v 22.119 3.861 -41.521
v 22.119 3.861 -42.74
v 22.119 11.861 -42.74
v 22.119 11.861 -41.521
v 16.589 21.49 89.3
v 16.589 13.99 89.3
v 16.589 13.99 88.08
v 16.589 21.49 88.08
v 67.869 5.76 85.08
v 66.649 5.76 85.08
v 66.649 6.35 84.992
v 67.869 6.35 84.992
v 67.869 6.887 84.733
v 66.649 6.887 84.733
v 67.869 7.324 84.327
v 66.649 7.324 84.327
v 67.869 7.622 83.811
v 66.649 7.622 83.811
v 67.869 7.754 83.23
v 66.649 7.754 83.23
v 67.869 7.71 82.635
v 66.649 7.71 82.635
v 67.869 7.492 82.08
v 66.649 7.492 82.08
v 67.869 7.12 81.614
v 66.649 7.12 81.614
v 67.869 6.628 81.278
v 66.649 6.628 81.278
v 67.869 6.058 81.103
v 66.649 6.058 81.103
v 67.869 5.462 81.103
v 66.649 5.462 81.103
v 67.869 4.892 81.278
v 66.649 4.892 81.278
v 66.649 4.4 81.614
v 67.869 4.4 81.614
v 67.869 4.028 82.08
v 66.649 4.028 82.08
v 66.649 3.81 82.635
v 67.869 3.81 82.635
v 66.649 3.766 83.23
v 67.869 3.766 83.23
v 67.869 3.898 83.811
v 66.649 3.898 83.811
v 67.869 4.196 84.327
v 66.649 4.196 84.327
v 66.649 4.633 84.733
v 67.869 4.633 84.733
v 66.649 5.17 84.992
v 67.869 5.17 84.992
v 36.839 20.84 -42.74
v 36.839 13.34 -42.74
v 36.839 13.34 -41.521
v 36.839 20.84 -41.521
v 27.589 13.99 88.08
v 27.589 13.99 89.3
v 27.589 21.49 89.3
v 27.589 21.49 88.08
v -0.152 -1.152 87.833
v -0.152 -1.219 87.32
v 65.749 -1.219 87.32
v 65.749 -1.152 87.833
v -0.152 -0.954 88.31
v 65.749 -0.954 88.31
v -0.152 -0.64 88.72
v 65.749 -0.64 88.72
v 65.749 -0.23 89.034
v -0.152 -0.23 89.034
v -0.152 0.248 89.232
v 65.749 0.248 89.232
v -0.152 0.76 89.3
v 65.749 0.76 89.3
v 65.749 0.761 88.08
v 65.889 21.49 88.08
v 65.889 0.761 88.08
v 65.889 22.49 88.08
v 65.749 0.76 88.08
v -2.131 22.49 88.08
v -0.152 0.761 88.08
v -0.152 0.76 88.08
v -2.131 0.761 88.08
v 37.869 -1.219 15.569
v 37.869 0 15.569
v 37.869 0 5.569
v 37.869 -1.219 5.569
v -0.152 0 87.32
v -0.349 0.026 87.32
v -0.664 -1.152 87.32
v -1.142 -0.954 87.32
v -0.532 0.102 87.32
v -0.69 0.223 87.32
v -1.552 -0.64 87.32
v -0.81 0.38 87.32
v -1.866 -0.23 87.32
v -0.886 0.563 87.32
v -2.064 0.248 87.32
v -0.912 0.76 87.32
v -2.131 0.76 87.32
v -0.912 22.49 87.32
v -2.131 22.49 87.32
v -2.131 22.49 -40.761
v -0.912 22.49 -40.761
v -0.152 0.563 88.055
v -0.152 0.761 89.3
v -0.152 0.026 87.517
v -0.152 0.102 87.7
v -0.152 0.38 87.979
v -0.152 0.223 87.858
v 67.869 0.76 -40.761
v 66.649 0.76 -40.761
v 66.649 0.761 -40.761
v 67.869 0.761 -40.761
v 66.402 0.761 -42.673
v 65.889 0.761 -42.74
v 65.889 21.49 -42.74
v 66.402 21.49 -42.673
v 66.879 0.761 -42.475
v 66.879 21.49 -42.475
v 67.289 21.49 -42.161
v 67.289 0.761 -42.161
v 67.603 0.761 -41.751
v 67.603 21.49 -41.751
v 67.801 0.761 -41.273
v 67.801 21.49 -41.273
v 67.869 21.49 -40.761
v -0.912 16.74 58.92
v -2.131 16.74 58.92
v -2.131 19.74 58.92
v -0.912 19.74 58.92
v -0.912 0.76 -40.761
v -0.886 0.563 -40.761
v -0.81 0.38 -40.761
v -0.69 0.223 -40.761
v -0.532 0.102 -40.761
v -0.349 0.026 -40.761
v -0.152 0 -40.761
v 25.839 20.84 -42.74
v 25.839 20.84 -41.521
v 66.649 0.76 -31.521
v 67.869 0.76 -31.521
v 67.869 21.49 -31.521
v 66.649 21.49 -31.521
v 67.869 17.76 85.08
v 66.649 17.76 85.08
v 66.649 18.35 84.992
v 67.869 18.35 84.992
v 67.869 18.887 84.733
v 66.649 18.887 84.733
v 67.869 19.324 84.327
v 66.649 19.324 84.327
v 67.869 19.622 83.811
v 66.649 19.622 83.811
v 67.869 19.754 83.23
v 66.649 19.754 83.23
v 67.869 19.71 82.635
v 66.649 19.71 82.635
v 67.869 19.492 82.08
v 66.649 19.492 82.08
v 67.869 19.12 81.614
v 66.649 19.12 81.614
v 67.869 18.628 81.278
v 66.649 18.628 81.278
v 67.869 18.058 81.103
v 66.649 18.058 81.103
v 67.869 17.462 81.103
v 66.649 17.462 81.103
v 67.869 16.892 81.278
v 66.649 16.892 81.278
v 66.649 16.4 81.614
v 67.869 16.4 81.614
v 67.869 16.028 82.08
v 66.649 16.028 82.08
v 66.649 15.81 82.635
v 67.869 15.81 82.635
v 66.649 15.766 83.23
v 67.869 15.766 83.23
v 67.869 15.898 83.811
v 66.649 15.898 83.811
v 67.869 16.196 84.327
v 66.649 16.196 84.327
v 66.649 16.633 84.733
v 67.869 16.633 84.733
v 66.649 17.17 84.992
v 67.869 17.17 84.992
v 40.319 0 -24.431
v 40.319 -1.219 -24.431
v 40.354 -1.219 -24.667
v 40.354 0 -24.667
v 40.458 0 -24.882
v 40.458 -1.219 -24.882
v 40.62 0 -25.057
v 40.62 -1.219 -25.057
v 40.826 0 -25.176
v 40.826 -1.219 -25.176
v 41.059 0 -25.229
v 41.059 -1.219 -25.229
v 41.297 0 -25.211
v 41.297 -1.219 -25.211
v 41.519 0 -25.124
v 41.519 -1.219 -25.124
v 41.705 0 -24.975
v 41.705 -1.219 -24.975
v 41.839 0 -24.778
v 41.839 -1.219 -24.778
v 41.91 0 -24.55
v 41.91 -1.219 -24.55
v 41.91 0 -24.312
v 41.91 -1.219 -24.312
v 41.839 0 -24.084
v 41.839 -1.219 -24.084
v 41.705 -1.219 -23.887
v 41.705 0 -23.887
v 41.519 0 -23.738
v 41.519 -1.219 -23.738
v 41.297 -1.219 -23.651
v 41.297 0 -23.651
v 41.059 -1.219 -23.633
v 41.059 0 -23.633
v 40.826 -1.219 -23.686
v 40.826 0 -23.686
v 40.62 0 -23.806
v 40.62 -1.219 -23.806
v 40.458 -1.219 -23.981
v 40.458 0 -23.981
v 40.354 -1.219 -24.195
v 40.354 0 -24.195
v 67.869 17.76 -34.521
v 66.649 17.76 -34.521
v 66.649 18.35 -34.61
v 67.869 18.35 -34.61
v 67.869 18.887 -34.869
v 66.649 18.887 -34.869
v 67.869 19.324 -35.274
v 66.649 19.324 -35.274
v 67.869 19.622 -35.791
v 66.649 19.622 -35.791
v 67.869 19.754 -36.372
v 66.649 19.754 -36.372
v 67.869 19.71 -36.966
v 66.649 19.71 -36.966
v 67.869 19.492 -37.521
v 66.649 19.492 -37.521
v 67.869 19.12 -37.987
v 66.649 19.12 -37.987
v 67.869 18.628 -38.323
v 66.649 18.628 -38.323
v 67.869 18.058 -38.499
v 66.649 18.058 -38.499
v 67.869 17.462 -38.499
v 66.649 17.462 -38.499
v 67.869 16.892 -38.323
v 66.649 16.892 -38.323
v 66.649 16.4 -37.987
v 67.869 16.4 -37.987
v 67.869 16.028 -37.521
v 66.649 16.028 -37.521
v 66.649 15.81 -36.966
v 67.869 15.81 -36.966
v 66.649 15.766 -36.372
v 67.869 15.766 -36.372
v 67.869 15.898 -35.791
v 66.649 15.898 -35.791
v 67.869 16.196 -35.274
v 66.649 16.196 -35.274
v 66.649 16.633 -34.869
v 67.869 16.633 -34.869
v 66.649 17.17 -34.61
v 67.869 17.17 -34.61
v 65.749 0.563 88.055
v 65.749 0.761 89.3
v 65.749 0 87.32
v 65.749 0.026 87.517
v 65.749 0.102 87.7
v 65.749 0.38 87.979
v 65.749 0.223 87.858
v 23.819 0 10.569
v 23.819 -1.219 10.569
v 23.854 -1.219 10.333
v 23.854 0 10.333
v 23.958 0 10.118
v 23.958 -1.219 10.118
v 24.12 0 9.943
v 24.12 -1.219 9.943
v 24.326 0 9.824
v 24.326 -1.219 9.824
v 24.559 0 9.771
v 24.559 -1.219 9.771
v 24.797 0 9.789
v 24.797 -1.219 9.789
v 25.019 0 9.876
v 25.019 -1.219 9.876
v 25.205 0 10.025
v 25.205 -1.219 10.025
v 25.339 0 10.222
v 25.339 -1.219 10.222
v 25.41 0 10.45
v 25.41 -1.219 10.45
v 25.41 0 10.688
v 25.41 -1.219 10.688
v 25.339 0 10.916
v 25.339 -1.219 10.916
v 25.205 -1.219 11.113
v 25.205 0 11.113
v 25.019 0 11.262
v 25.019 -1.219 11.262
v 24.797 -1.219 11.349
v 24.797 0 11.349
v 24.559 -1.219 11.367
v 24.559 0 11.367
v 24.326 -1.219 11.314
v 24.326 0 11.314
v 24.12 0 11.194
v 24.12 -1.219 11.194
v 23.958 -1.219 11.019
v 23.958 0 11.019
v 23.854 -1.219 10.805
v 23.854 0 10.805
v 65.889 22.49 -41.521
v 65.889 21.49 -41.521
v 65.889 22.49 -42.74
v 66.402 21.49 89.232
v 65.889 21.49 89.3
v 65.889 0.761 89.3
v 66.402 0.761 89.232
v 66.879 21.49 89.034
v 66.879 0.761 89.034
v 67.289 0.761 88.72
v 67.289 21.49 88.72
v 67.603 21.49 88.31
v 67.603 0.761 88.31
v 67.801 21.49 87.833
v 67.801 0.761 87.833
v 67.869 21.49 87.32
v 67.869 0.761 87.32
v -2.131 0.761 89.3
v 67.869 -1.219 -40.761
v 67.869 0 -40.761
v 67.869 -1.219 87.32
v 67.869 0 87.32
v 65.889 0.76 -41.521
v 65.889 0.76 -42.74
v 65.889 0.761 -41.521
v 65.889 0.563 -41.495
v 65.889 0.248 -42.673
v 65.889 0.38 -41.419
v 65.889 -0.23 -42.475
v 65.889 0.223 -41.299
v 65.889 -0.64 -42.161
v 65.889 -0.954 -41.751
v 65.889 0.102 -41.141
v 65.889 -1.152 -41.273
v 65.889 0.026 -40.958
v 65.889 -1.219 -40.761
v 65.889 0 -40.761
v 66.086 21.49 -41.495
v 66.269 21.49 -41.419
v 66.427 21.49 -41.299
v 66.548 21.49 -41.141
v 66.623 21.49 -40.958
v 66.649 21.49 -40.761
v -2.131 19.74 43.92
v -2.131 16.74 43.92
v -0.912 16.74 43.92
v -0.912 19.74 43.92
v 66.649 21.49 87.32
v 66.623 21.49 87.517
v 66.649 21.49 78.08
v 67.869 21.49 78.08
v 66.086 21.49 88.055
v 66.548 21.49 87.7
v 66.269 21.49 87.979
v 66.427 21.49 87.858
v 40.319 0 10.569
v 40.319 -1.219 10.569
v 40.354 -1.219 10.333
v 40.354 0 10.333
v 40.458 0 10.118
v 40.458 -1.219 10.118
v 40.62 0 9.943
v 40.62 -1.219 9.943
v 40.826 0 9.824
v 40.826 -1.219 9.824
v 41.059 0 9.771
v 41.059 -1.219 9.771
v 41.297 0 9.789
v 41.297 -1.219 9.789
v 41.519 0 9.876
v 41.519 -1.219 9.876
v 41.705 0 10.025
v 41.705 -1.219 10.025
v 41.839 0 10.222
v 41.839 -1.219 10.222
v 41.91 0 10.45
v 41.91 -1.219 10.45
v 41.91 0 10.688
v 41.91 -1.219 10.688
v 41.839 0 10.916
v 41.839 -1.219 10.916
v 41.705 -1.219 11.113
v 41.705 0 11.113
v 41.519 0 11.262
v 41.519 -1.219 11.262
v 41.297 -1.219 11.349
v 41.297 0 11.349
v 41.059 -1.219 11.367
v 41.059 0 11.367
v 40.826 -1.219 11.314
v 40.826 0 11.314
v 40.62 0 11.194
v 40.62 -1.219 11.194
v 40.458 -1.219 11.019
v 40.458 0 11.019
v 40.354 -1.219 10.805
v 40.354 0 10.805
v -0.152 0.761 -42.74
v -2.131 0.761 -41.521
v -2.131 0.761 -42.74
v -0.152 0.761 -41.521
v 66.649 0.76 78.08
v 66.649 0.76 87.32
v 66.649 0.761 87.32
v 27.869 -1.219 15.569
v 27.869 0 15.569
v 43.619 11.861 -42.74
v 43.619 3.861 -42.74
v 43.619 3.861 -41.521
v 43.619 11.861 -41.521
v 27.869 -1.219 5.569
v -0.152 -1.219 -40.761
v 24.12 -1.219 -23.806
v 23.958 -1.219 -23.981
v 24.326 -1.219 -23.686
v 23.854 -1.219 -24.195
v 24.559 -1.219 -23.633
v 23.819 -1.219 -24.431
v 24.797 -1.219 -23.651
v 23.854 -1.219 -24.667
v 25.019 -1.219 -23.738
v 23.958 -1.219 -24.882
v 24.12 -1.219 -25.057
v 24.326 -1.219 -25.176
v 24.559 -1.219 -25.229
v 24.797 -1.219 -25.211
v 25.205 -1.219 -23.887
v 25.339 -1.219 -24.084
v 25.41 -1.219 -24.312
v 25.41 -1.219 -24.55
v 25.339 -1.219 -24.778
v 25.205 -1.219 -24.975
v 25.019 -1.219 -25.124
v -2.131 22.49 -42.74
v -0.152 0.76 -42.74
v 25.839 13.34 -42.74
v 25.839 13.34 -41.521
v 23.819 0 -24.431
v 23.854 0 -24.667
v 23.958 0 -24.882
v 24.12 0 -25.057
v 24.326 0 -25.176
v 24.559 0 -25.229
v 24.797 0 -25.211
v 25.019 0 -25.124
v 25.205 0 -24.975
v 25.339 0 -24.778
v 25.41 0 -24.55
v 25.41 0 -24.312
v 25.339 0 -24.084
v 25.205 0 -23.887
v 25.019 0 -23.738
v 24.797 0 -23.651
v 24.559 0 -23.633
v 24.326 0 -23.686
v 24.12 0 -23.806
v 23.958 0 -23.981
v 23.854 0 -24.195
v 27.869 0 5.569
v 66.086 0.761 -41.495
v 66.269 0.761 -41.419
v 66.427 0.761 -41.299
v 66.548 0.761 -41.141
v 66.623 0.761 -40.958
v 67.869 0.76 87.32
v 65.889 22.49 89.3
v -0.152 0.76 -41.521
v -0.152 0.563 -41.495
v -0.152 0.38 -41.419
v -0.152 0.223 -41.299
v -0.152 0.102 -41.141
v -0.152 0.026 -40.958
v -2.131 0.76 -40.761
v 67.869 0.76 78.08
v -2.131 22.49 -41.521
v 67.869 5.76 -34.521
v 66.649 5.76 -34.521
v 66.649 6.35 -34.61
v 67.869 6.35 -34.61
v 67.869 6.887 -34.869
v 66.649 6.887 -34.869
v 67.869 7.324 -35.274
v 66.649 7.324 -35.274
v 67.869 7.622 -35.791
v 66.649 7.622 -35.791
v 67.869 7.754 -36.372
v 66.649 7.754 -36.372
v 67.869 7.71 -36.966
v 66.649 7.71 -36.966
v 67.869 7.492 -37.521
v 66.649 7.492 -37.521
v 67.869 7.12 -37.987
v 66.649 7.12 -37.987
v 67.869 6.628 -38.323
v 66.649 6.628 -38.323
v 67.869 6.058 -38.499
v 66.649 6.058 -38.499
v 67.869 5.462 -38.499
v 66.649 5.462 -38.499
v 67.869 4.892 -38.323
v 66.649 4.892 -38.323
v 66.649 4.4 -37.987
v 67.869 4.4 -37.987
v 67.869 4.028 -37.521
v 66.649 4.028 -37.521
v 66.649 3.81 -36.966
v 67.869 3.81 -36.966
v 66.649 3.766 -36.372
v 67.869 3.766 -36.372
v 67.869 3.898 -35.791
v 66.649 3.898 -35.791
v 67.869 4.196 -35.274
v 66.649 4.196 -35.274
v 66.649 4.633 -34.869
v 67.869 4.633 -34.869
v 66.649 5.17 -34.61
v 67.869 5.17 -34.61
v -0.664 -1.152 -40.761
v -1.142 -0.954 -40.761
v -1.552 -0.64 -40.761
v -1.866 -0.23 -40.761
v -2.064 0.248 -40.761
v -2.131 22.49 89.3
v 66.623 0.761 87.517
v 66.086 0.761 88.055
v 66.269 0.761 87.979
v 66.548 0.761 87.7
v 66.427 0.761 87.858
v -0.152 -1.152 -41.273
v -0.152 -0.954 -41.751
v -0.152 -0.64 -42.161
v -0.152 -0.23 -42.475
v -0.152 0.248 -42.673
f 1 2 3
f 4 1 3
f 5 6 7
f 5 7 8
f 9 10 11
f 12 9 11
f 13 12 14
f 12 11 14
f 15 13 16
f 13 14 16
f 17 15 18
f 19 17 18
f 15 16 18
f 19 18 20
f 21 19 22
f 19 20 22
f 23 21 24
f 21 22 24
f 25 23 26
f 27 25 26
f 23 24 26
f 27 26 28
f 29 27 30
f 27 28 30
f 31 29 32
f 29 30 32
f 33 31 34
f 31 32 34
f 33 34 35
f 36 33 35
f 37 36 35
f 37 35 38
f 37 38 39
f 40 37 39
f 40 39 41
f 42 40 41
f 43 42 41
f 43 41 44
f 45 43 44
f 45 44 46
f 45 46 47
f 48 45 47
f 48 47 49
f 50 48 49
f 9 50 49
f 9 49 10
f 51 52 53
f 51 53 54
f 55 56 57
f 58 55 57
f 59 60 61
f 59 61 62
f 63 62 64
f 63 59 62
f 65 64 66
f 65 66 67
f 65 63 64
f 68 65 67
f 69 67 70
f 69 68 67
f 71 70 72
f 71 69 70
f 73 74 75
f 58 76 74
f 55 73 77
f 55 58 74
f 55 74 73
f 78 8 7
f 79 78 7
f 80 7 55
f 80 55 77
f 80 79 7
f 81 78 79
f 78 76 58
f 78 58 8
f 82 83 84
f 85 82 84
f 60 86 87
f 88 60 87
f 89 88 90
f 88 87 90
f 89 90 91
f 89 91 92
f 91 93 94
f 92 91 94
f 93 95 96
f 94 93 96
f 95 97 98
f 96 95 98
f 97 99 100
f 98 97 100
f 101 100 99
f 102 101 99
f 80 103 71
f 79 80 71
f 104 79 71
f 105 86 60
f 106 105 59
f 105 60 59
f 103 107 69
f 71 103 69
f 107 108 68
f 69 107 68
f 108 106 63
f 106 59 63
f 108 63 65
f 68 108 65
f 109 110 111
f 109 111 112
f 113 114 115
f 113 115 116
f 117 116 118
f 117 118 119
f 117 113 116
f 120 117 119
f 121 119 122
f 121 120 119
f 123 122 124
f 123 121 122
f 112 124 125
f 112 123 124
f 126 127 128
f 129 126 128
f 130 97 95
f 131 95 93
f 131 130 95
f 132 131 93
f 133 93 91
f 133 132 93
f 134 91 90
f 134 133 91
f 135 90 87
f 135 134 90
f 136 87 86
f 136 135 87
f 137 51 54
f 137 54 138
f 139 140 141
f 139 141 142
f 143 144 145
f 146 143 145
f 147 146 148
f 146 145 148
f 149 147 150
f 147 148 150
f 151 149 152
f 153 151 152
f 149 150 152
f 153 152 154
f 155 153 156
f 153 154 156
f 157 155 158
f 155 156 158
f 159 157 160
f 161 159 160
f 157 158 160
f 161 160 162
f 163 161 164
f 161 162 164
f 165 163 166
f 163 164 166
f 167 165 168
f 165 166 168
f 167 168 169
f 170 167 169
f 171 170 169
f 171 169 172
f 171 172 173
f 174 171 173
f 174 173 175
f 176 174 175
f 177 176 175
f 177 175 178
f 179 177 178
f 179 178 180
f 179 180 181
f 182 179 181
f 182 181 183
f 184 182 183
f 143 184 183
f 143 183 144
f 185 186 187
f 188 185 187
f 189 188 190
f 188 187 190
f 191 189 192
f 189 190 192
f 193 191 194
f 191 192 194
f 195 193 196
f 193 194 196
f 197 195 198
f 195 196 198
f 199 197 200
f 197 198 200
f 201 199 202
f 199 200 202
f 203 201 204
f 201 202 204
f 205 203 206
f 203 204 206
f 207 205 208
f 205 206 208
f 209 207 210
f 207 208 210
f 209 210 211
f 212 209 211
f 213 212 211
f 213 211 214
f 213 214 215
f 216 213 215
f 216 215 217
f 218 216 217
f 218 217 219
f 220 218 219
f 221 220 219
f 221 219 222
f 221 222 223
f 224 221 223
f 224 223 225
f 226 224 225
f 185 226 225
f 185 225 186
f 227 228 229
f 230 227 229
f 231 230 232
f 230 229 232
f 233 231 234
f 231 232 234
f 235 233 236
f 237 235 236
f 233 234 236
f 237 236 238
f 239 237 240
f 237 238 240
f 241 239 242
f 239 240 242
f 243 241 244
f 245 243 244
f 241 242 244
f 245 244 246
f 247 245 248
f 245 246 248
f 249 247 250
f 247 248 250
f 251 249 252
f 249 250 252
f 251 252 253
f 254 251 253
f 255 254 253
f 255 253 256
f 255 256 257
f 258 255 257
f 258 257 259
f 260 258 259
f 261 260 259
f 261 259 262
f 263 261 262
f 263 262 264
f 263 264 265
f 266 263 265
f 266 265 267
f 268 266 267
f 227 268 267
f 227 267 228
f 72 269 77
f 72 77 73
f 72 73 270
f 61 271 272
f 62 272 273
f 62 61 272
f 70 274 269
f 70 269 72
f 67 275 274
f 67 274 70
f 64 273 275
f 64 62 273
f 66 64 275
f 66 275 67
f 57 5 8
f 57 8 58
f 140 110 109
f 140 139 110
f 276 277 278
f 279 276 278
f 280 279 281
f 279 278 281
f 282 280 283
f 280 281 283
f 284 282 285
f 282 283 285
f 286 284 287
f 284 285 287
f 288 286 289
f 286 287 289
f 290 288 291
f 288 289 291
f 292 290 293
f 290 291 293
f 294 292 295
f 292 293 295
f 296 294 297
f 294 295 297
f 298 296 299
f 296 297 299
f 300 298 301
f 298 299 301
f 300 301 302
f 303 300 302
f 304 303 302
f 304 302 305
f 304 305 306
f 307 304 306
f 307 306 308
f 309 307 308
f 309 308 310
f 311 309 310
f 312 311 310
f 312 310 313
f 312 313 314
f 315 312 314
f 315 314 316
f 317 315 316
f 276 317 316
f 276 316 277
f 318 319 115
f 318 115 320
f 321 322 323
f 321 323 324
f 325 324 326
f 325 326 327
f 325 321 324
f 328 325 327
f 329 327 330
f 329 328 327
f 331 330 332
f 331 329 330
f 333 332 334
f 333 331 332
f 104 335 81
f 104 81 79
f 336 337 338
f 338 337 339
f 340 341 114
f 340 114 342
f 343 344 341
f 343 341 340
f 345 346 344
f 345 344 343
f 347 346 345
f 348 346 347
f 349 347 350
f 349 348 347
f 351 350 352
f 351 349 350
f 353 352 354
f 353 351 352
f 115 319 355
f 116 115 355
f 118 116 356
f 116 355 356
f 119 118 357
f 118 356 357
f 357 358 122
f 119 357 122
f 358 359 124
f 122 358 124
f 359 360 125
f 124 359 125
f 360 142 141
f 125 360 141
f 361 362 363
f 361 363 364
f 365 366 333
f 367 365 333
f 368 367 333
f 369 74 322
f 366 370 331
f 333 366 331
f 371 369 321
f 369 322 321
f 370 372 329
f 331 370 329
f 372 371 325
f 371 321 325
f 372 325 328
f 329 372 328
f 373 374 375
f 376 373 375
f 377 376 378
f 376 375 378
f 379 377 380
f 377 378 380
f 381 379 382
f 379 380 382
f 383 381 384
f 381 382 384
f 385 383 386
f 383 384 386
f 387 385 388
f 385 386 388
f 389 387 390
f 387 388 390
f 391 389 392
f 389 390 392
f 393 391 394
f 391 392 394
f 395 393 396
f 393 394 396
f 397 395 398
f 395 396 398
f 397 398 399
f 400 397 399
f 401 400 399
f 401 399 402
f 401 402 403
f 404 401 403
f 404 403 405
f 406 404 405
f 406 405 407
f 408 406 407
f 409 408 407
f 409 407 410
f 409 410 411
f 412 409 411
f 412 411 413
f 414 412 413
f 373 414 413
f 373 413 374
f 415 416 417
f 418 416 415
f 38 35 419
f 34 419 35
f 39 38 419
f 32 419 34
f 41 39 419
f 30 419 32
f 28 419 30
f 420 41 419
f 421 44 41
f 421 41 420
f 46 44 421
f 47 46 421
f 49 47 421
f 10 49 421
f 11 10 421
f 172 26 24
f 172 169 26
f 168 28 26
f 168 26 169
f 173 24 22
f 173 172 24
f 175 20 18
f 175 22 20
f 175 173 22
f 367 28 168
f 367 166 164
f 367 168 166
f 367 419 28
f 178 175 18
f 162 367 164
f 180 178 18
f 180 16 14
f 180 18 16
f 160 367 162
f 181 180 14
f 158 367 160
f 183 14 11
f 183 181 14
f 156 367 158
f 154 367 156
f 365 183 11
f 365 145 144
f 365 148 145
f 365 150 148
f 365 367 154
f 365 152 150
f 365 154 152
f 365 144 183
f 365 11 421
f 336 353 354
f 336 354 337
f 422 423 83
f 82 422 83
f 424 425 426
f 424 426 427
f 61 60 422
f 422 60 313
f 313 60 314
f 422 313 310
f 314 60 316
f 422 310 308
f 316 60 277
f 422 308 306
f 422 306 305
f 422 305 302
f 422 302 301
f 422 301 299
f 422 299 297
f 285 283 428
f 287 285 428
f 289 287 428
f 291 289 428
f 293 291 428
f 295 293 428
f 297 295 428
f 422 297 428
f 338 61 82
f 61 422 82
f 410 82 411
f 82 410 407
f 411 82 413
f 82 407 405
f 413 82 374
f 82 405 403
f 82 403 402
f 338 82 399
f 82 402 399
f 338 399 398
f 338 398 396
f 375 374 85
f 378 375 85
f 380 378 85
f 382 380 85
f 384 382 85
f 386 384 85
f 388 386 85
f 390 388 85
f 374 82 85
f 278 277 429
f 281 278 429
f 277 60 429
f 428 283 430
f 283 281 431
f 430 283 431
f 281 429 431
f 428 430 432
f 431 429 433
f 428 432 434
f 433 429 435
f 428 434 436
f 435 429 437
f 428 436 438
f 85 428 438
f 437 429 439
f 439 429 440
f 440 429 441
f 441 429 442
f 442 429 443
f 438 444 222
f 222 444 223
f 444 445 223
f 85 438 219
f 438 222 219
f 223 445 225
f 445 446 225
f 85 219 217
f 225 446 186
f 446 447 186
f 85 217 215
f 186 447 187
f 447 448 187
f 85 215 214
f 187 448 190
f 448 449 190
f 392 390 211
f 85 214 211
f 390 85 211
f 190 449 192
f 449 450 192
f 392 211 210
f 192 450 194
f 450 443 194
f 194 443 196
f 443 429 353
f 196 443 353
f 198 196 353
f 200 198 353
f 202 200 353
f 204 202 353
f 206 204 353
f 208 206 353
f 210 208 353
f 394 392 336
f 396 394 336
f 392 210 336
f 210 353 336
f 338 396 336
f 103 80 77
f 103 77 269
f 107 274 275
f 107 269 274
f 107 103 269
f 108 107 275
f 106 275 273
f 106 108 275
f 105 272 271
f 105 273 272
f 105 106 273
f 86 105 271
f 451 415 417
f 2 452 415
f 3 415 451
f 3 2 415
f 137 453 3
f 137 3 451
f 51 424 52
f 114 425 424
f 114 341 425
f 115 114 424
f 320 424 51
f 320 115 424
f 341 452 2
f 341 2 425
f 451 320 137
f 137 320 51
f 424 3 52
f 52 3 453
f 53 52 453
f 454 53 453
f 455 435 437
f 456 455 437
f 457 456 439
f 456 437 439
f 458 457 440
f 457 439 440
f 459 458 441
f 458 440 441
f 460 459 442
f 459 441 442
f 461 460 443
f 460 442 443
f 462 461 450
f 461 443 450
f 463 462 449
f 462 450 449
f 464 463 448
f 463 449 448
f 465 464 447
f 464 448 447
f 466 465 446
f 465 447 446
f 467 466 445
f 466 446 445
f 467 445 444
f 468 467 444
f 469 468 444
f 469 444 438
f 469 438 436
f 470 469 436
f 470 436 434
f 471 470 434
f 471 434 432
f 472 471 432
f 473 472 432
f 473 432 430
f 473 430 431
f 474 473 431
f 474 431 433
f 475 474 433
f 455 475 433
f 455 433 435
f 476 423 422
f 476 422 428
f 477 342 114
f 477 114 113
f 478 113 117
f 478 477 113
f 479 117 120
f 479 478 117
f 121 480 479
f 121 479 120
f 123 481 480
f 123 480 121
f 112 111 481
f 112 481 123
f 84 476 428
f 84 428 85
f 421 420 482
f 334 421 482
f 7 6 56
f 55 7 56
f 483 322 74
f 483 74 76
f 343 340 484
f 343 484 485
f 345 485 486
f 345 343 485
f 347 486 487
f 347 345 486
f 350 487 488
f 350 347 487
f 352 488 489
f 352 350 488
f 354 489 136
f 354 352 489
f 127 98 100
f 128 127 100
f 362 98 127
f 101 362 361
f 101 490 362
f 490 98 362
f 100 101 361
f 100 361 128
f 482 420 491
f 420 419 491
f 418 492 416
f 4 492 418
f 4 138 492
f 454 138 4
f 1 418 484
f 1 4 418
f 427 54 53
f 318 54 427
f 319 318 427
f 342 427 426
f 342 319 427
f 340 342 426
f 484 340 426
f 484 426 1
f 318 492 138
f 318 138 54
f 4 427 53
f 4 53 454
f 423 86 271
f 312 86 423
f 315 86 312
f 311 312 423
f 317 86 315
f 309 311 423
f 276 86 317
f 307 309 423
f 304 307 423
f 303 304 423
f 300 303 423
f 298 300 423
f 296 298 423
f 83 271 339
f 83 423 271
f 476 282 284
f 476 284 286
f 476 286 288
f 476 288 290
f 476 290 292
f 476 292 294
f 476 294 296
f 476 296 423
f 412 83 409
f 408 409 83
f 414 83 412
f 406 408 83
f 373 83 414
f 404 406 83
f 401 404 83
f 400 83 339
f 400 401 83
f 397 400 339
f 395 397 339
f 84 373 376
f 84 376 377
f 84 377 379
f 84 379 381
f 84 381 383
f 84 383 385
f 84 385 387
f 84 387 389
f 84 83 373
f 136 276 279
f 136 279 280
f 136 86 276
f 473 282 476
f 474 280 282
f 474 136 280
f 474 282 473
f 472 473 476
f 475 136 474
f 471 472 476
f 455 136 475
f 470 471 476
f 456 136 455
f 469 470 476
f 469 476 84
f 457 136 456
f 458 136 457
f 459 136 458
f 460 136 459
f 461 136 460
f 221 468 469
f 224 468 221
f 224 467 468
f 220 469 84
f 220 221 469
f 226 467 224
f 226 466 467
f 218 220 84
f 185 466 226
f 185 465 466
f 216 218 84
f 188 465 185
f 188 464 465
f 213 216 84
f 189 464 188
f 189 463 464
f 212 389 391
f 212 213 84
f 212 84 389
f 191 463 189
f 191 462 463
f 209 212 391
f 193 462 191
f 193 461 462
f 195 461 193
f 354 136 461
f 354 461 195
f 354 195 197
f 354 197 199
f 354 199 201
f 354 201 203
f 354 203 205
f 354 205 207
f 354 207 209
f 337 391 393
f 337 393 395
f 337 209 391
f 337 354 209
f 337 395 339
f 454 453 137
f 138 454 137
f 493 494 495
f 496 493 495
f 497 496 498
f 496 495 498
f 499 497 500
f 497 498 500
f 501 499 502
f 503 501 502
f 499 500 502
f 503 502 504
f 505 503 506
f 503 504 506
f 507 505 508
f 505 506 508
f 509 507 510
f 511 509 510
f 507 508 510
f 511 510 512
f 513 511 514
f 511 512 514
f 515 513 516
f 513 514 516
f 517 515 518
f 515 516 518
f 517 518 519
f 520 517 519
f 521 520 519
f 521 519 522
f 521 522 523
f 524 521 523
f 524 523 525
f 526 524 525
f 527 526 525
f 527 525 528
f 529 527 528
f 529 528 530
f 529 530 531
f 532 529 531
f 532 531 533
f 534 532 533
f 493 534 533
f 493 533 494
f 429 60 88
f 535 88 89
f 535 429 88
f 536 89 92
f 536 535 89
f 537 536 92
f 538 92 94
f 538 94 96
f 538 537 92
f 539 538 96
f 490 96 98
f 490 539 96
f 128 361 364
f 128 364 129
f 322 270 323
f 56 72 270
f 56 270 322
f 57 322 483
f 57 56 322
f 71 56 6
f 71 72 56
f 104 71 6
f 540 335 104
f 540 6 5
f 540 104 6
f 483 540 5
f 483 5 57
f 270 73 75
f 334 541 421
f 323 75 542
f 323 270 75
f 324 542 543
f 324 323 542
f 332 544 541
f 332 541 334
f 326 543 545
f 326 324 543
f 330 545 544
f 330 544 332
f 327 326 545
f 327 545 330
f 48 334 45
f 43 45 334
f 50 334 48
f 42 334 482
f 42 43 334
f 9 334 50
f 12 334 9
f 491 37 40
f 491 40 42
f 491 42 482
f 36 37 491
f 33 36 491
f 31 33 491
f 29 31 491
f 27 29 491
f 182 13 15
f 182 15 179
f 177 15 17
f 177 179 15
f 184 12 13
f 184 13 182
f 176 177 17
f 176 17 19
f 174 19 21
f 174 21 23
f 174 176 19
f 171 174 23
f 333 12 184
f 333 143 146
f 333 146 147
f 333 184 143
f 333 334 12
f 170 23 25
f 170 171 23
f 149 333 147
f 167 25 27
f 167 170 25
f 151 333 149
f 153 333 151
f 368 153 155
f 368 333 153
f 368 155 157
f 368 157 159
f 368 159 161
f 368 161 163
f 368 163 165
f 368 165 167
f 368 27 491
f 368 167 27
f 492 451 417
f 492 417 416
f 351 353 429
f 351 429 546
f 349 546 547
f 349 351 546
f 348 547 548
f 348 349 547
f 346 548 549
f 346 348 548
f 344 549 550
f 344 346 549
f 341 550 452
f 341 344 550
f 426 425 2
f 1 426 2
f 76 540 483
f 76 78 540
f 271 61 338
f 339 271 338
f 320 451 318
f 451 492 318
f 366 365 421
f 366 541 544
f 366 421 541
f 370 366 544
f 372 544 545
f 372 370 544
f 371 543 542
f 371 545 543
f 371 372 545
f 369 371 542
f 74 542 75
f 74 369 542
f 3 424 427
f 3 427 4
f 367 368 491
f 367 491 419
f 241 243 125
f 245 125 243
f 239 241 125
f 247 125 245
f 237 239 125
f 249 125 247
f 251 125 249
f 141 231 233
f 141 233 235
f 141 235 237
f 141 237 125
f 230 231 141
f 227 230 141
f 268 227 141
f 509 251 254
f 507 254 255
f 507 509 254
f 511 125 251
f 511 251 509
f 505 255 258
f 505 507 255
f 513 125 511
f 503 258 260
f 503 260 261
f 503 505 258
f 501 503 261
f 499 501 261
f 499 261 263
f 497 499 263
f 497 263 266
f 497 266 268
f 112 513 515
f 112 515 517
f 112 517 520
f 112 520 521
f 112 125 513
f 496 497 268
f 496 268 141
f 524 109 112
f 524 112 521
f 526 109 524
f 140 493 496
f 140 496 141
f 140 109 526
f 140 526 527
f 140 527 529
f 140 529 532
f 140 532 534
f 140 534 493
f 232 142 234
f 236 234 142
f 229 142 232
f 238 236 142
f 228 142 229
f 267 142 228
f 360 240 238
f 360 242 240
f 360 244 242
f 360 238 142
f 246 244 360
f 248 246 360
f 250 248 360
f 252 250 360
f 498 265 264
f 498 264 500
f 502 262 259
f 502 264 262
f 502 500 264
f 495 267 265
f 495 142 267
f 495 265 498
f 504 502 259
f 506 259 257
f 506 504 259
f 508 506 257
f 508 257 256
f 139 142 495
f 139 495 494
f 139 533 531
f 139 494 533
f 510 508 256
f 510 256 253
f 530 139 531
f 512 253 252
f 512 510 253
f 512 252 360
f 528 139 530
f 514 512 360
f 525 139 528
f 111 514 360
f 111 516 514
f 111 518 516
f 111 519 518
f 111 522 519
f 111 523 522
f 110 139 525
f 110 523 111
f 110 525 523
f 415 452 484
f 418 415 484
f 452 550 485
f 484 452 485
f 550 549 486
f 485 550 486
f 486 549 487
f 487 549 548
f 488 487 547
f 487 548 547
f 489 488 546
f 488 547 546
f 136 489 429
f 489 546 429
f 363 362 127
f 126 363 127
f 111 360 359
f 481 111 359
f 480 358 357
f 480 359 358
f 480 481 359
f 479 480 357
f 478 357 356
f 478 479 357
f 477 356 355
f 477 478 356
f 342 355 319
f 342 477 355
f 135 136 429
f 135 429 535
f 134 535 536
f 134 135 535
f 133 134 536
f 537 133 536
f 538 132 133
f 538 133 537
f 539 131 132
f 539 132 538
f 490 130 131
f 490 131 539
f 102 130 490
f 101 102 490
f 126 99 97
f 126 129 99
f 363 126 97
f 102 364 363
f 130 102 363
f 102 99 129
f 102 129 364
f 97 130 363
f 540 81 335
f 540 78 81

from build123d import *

# Parameters (mm, degrees)
SKETCH2_W                    = 70
SKETCH2_H                    = 132.04
BASE_FLANGE1_DEPTH           = 1.2192
EDGE_FLANGE1_STRIP_W         = 6.3968
EDGE_FLANGE1_STRIP_H         = 1.2192
EDGE_FLANGE1_STRIP_CUT_DEPTH = 70
EDGE_FLANGE1_DEPTH           = 70
EDGE_FLANGE2_STRIP_W         = 6.3968
EDGE_FLANGE2_STRIP_H         = 1.2192
EDGE_FLANGE2_STRIP_CUT_DEPTH = 70
EDGE_FLANGE2_DEPTH           = 70
EDGE_FLANGE3_STRIP_W         = 6.3968
EDGE_FLANGE3_STRIP_H         = 1.2192
EDGE_FLANGE3_STRIP_CUT_DEPTH = 21.73
EDGE_FLANGE3_DEPTH           = 21.73
EDGE_FLANGE4_STRIP_W         = 6.3968
EDGE_FLANGE4_STRIP_H         = 1.2192
EDGE_FLANGE4_STRIP_CUT_DEPTH = 21.73
EDGE_FLANGE4_DEPTH           = 21.73
EDGE_FLANGE5_STRIP_W         = 6.3968
EDGE_FLANGE5_STRIP_H         = 1.2192
EDGE_FLANGE5_STRIP_CUT_DEPTH = 128.0816
EDGE_FLANGE5_DEPTH           = 128.0816
SKETCH24_W                   = 2.12
SKETCH24_H                   = 1.9792
CUT_EXTRUDE1_DEPTH           = 1.98
SKETCH29_W                   = 1.9792
SKETCH29_H                   = 2.12
CUT_EXTRUDE2_DEPTH           = 1.98
SKETCH30_W                   = 1.9792
SKETCH30_H                   = 1.9792
CUT_EXTRUDE3_DEPTH           = 1.98
SKETCH31_W                   = 1.9792
SKETCH31_H                   = 1.9792
CUT_EXTRUDE4_DEPTH           = 1.98
SKETCH34_W                   = 1.9792
SKETCH34_H                   = 1
CUT_EXTRUDE5_DEPTH           = 151.154943887
F_4_0MM_DOWEL_HOLE1_D        = 4
F_4_0MM_DOWEL_HOLE1_DEPTH    = 1.2192
CUT_EXTRUDE6_REACH           = 152.155
SKETCH38_W                   = 11
SKETCH38_H                   = 7.5
CUT_EXTRUDE7_REACH           = 152.155
SKETCH39_W                   = 11
SKETCH39_H                   = 7.5
CUT_EXTRUDE8_REACH           = 117.673
SKETCH40_W                   = 15
SKETCH40_H                   = 3
M2_TAPPED_HOLE1_D            = 1.6
CUT_EXTRUDE9_REACH           = 116.396
SKETCH41_W                   = 10
SKETCH41_H                   = 10
CUT_EXTRUDE10_REACH          = 152.155
SKETCH45_W                   = 21.5
SKETCH45_H                   = 8


# Sheet-metal steps are written as plain solids
with BuildPart() as part:
    # Sketch2 → Base-Flange1 (new body)
    with BuildSketch(Plane(origin=(0, 0, 0), x_dir=(1, 0, 0), z_dir=(0, 1, 0))):
        with Locations((32.868589744, -23.279615385)):
            Rectangle(SKETCH2_W, SKETCH2_H)
    extrude(amount=-BASE_FLANGE1_DEPTH)

    # Edge-Flange1 strip (across the edge) → Edge-Flange1 strip cut (cut)
    with BuildSketch(Plane(origin=(67.868589744, 0, -42.740384615), x_dir=(0, 0, 1), z_dir=(-1, 0, 0))):
        with Locations((-1.2192, -0.6096)):
            Rectangle(EDGE_FLANGE1_STRIP_W, EDGE_FLANGE1_STRIP_H)
    extrude(amount=EDGE_FLANGE1_STRIP_CUT_DEPTH, mode=Mode.SUBTRACT)

    # Edge-Flange1 section (across the edge) → Edge-Flange1 (add)
    with BuildSketch(Plane(origin=(67.868589744, 0, -42.740384615), x_dir=(0, 0, 1), z_dir=(-1, 0, 0))):
        with BuildLine():
            Line((0, 0.76), (0, 22.49))
            Line((0, 22.49), (1.2192, 22.49))
            Line((1.2192, 22.49), (1.2192, 0.76))
            ThreePointArc((1.2192, 0.76), (1.441798846, 0.222598846), (1.9792, 0))
            Line((1.9792, 0), (1.9792, -1.2192))
            ThreePointArc((1.9792, -1.2192), (0.579694259, -0.639505741), (0, 0.76))
        make_face()
    extrude(amount=EDGE_FLANGE1_DEPTH)

    # Edge-Flange2 strip (across the edge) → Edge-Flange2 strip cut (cut)
    with BuildSketch(Plane(origin=(-2.131410256, 0, 89.299615385), x_dir=(0, 0, -1), z_dir=(1, 0, 0))):
        with Locations((-1.2192, -0.6096)):
            Rectangle(EDGE_FLANGE2_STRIP_W, EDGE_FLANGE2_STRIP_H)
    extrude(amount=EDGE_FLANGE2_STRIP_CUT_DEPTH, mode=Mode.SUBTRACT)

    # Edge-Flange2 section (across the edge) → Edge-Flange2 (add)
    with BuildSketch(Plane(origin=(-2.131410256, 0, 89.299615385), x_dir=(0, 0, -1), z_dir=(1, 0, 0))):
        with BuildLine():
            Line((0, 0.76), (0, 22.49))
            Line((0, 22.49), (1.2192, 22.49))
            Line((1.2192, 22.49), (1.2192, 0.76))
            ThreePointArc((1.2192, 0.76), (1.441798846, 0.222598846), (1.9792, 0))
            Line((1.9792, 0), (1.9792, -1.2192))
            ThreePointArc((1.9792, -1.2192), (0.579694259, -0.639505741), (0, 0.76))
        make_face()
    extrude(amount=EDGE_FLANGE2_DEPTH)

    # Edge-Flange3 strip (across the edge) → Edge-Flange3 strip cut (cut)
    with BuildSketch(Plane(origin=(67.868589744, 0.76, -41.521184615), x_dir=(-1, 0, 0), z_dir=(0, 1, 0))):
        with Locations((-1.2192, -0.6096)):
            Rectangle(EDGE_FLANGE3_STRIP_W, EDGE_FLANGE3_STRIP_H)
    extrude(amount=EDGE_FLANGE3_STRIP_CUT_DEPTH, mode=Mode.SUBTRACT)

    # Edge-Flange3 section (across the edge) → Edge-Flange3 (add)
    with BuildSketch(Plane(origin=(67.868589744, 0.76, -41.521184615), x_dir=(-1, 0, 0), z_dir=(0, 1, 0))):
        with BuildLine():
            Line((0, 0.76), (0, 10))
            Line((0, 10), (1.2192, 10))
            Line((1.2192, 10), (1.2192, 0.76))
            ThreePointArc((1.2192, 0.76), (1.441798846, 0.222598846), (1.9792, 0))
            Line((1.9792, 0), (1.9792, -1.2192))
            ThreePointArc((1.9792, -1.2192), (0.579694259, -0.639505741), (0, 0.76))
        make_face()
    extrude(amount=EDGE_FLANGE3_DEPTH)

    # Edge-Flange4 strip (across the edge) → Edge-Flange4 strip cut (cut)
    with BuildSketch(Plane(origin=(67.868589744, 22.49, 88.080415385), x_dir=(-1, 0, 0), z_dir=(0, -1, 0))):
        with Locations((-1.2192, -0.6096)):
            Rectangle(EDGE_FLANGE4_STRIP_W, EDGE_FLANGE4_STRIP_H)
    extrude(amount=EDGE_FLANGE4_STRIP_CUT_DEPTH, mode=Mode.SUBTRACT)

    # Edge-Flange4 section (across the edge) → Edge-Flange4 (add)
    with BuildSketch(Plane(origin=(67.868589744, 22.49, 88.080415385), x_dir=(-1, 0, 0), z_dir=(0, -1, 0))):
        with BuildLine():
            Line((0, 0.76), (0, 10))
            Line((0, 10), (1.2192, 10))
            Line((1.2192, 10), (1.2192, 0.76))
            ThreePointArc((1.2192, 0.76), (1.441798846, 0.222598846), (1.9792, 0))
            Line((1.9792, 0), (1.9792, -1.2192))
            ThreePointArc((1.9792, -1.2192), (0.579694259, -0.639505741), (0, 0.76))
        make_face()
    extrude(amount=EDGE_FLANGE4_DEPTH)

    # Edge-Flange5 strip (across the edge) → Edge-Flange5 strip cut (cut)
    with BuildSketch(Plane(origin=(-2.131410256, 0, -40.761184615), x_dir=(1, 0, 0), z_dir=(0, 0, 1))):
        with Locations((-1.2192, -0.6096)):
            Rectangle(EDGE_FLANGE5_STRIP_W, EDGE_FLANGE5_STRIP_H)
    extrude(amount=EDGE_FLANGE5_STRIP_CUT_DEPTH, mode=Mode.SUBTRACT)

    # Edge-Flange5 section (across the edge) → Edge-Flange5 (add)
    with BuildSketch(Plane(origin=(-2.131410256, 0, -40.761184615), x_dir=(1, 0, 0), z_dir=(0, 0, 1))):
        with BuildLine():
            Line((0, 0.76), (0, 22.49))
            Line((0, 22.49), (1.2192, 22.49))
            Line((1.2192, 22.49), (1.2192, 0.76))
            ThreePointArc((1.2192, 0.76), (1.441798846, 0.222598846), (1.9792, 0))
            Line((1.9792, 0), (1.9792, -1.2192))
            ThreePointArc((1.9792, -1.2192), (0.579694259, -0.639505741), (0, 0.76))
        make_face()
    extrude(amount=EDGE_FLANGE5_DEPTH)

    # Sketch24 → Cut-Extrude1 (cut)
    with BuildSketch(Plane.XZ.offset(1.2192)):
        with Locations((66.808589744, 88.310015385)):
            Rectangle(SKETCH24_W, SKETCH24_H)
    extrude(amount=-CUT_EXTRUDE1_DEPTH, mode=Mode.SUBTRACT)

    # Sketch29 → Cut-Extrude2 (cut)
    with BuildSketch(Plane.XZ.offset(1.2192)):
        with Locations((-1.141810256, 88.380415385)):
            Rectangle(SKETCH29_W, SKETCH29_H)
    extrude(amount=-CUT_EXTRUDE2_DEPTH, mode=Mode.SUBTRACT)

    # Sketch30 → Cut-Extrude3 (cut)
    with BuildSketch(Plane.XZ.offset(1.2192)):
        with Locations((-1.141810256, -41.750784615)):
            Rectangle(SKETCH30_W, SKETCH30_H)
    extrude(amount=-CUT_EXTRUDE3_DEPTH, mode=Mode.SUBTRACT)

    # Sketch31 → Cut-Extrude4 (cut)
    with BuildSketch(Plane.XZ.offset(1.2192)):
        with Locations((66.878989744, -41.750784615)):
            Rectangle(SKETCH31_W, SKETCH31_H)
    extrude(amount=-CUT_EXTRUDE4_DEPTH, mode=Mode.SUBTRACT)

    # Sketch34 → Cut-Extrude5 (cut, through all)
    with BuildSketch(Plane.XY.offset(89.299615385)):
        with Locations((66.878989744, 21.99)):
            Rectangle(SKETCH34_W, SKETCH34_H)
    extrude(amount=-CUT_EXTRUDE5_DEPTH, mode=Mode.SUBTRACT)

    # Ø4.0mm Dowel Hole1
    with Locations(Plane(origin=(67.868589744, 0, 0), x_dir=(0, 0, -1), z_dir=(1, 0, 0))):
        with Locations((-83.080415385, 17.76), (-83.080415385, 5.76), (36.521184615, 17.76), (36.521184615, 5.76)):
            Hole(F_4_0MM_DOWEL_HOLE1_D / 2, depth=F_4_0MM_DOWEL_HOLE1_DEPTH)

    # Sketch38 → Cut-Extrude6 (cut, up to next)
    with BuildSketch(Plane.XY.offset(89.299615385), mode=Mode.PRIVATE) as cut_extrude6_sk1:
        with Locations((22.088589744, 17.74)):
            Rectangle(SKETCH38_W, SKETCH38_H)
    cut_extrude6_tool1 = extrude(cut_extrude6_sk1.sketch, amount=-CUT_EXTRUDE6_REACH, mode=Mode.PRIVATE) & part.part
    add(cut_extrude6_tool1.solids().sort_by_distance((22.08859, 17.74, 89.299615))[0], mode=Mode.SUBTRACT)

    # Sketch39 → Cut-Extrude7 (cut, up to next)
    with BuildSketch(Plane(origin=(0, 0, -42.740384615), x_dir=(-1, 0, 0), z_dir=(0, 0, -1)), mode=Mode.PRIVATE) as cut_extrude7_sk1:
        with Locations((-31.338589744, 17.09)):
            Rectangle(SKETCH39_W, SKETCH39_H)
    cut_extrude7_tool1 = extrude(cut_extrude7_sk1.sketch, amount=-CUT_EXTRUDE7_REACH, mode=Mode.PRIVATE) & part.part
    add(cut_extrude7_tool1.solids().sort_by_distance((31.33859, 17.09, -42.740385))[0], mode=Mode.SUBTRACT)

    # Sketch40 → Cut-Extrude8 (cut, up to next)
    with BuildSketch(Plane.ZY.offset(2.131410256), mode=Mode.PRIVATE) as cut_extrude8_sk1:
        with Locations((51.420415385, 18.24)):
            Rectangle(SKETCH40_W, SKETCH40_H)
    cut_extrude8_tool1 = extrude(cut_extrude8_sk1.sketch, amount=-CUT_EXTRUDE8_REACH, mode=Mode.PRIVATE) & part.part
    add(cut_extrude8_tool1.solids().sort_by_distance((-2.13141, 18.24, 51.420415))[0], mode=Mode.SUBTRACT)

    # M2 Tapped Hole1 (through all)
    with Locations(Plane(origin=(0, 0, 0), x_dir=(1, 0, 0), z_dir=(0, 1, 0))):
        with Locations((24.618589744, 24.431184615), (41.118589744, 24.431184615), (41.118589744, -10.568815385), (24.618589744, -10.568815385)):
            Hole(M2_TAPPED_HOLE1_D / 2)

    # Sketch41 → Cut-Extrude9 (cut, up to next)
    with BuildSketch(Plane(origin=(0, 0, 0), x_dir=(1, 0, 0), z_dir=(0, 1, 0)), mode=Mode.PRIVATE) as cut_extrude9_sk1:
        with Locations((32.868589744, -10.568815385)):
            Rectangle(SKETCH41_W, SKETCH41_H)
    cut_extrude9_tool1 = extrude(cut_extrude9_sk1.sketch, amount=-CUT_EXTRUDE9_REACH, mode=Mode.PRIVATE) & part.part
    add(cut_extrude9_tool1.solids().sort_by_distance((32.86859, 0, 10.568815))[0], mode=Mode.SUBTRACT)

    # Sketch45 → Cut-Extrude10 (cut, up to next)
    with BuildSketch(Plane(origin=(0, 0, -42.740384615), x_dir=(-1, 0, 0), z_dir=(0, 0, -1)), mode=Mode.PRIVATE) as cut_extrude10_sk1:
        with Locations((-32.868589744, 7.8608)):
            Rectangle(SKETCH45_W, SKETCH45_H)
    cut_extrude10_tool1 = extrude(cut_extrude10_sk1.sketch, amount=-CUT_EXTRUDE10_REACH, mode=Mode.PRIVATE) & part.part
    add(cut_extrude10_tool1.solids().sort_by_distance((32.86859, 7.8608, -42.740385))[0], mode=Mode.SUBTRACT)


solid = part.part
